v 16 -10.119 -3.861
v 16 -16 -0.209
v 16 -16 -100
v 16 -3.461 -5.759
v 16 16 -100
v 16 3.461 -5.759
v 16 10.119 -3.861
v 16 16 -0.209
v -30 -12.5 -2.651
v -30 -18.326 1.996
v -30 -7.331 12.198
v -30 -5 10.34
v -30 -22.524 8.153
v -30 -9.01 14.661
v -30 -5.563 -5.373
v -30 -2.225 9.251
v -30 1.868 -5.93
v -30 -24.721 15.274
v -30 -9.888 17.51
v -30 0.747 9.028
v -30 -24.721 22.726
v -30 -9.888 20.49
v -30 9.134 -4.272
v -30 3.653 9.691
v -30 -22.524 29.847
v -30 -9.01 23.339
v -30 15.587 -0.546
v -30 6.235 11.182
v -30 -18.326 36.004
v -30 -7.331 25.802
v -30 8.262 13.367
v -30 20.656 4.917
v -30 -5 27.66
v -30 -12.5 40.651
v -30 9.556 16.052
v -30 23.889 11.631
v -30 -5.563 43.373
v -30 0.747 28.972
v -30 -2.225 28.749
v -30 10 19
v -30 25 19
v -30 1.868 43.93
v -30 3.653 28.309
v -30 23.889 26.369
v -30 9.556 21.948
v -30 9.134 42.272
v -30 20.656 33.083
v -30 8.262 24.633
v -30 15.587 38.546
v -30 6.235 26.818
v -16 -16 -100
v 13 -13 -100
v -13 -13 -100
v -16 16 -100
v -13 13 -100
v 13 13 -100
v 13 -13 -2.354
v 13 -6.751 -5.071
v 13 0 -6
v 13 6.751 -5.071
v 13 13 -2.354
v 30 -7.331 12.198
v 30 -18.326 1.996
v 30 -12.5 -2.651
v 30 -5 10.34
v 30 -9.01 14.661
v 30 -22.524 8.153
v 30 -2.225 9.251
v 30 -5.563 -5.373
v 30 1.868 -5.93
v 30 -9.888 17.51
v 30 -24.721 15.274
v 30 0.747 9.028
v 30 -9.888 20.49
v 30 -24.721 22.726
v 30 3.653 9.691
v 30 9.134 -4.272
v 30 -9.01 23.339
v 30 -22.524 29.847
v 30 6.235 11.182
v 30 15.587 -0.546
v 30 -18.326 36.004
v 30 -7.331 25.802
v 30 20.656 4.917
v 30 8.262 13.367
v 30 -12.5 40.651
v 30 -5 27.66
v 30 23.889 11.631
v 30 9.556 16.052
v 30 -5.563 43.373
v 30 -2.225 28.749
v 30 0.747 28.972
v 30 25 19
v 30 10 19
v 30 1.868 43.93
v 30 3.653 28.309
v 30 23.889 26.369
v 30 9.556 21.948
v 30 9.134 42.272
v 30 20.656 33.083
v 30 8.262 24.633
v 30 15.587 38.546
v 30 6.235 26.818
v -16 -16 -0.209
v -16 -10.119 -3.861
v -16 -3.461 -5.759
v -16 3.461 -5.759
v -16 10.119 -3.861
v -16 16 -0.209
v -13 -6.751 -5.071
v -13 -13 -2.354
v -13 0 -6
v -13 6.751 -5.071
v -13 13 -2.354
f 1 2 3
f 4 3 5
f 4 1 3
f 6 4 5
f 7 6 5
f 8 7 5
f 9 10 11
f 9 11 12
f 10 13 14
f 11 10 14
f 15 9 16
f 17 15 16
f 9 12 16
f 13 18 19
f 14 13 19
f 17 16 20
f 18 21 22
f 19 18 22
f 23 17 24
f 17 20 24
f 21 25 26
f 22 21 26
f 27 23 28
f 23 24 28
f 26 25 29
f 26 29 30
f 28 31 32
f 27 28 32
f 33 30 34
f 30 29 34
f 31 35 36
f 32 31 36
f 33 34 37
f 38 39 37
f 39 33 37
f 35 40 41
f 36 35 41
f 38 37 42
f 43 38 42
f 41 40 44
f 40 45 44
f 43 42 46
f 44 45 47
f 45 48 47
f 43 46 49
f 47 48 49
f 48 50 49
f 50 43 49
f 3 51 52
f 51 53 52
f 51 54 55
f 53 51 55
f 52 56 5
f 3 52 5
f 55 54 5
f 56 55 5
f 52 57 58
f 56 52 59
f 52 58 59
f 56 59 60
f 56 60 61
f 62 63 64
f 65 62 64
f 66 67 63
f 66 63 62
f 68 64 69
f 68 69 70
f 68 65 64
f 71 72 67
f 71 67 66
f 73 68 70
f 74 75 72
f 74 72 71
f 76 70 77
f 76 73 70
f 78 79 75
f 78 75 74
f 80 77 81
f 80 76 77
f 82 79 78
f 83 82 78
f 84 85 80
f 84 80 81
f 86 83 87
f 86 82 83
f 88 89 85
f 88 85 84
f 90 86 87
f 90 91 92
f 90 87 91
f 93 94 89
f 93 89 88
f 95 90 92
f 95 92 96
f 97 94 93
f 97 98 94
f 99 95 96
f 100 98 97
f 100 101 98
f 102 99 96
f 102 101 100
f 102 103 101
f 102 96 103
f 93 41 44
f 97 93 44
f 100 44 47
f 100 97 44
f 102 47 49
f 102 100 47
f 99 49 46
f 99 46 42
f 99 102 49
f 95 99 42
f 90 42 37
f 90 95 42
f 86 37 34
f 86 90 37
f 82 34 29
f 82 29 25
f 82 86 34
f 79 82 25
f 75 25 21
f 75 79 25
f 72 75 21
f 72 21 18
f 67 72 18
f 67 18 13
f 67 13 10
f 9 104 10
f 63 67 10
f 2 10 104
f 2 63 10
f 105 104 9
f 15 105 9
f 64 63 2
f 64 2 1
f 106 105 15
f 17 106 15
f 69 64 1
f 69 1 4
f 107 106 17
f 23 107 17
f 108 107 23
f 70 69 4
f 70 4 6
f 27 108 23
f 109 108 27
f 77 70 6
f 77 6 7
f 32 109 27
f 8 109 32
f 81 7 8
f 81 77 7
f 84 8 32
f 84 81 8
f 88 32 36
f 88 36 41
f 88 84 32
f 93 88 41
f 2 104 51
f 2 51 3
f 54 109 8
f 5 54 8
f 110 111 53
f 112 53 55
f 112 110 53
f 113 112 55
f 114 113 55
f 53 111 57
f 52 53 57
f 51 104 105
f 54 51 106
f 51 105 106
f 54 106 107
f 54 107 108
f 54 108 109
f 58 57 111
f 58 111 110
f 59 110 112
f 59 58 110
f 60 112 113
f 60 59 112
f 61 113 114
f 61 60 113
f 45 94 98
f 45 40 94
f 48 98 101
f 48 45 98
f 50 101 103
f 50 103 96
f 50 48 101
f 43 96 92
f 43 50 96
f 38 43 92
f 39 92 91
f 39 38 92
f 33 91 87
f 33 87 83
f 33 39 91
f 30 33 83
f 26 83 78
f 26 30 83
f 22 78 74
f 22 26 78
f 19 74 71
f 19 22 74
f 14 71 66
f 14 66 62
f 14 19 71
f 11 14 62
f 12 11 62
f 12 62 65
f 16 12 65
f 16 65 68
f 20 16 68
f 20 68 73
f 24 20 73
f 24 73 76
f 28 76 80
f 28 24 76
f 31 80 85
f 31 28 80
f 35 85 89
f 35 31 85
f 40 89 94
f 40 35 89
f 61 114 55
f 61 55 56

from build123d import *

# Parameters (mm, degrees)
F0_W     = 32
F0_H     = 32
F0_W_2   = 26
F0_H_2   = 26
F1_DEPTH = 100
F2_R     = 25
F2_R_2   = 10
F3_DEPTH = 30


with BuildPart() as f1:
    # F0 (on Top) → F1 (new body)
    with BuildSketch(Plane.XY):
        Rectangle(F0_W, F0_H)
        Rectangle(F0_W_2, F0_H_2, mode=Mode.SUBTRACT)
    extrude(amount=-F1_DEPTH)

    # F2 (on Right) → F3 (join, symmetric)
    with BuildSketch(Plane.YZ):
        with Locations((0, 19)):
            Circle(F2_R)
        with Locations((0, 19)):
            Circle(F2_R_2, mode=Mode.SUBTRACT)
    extrude(amount=F3_DEPTH, both=True)


solid = f1.part
